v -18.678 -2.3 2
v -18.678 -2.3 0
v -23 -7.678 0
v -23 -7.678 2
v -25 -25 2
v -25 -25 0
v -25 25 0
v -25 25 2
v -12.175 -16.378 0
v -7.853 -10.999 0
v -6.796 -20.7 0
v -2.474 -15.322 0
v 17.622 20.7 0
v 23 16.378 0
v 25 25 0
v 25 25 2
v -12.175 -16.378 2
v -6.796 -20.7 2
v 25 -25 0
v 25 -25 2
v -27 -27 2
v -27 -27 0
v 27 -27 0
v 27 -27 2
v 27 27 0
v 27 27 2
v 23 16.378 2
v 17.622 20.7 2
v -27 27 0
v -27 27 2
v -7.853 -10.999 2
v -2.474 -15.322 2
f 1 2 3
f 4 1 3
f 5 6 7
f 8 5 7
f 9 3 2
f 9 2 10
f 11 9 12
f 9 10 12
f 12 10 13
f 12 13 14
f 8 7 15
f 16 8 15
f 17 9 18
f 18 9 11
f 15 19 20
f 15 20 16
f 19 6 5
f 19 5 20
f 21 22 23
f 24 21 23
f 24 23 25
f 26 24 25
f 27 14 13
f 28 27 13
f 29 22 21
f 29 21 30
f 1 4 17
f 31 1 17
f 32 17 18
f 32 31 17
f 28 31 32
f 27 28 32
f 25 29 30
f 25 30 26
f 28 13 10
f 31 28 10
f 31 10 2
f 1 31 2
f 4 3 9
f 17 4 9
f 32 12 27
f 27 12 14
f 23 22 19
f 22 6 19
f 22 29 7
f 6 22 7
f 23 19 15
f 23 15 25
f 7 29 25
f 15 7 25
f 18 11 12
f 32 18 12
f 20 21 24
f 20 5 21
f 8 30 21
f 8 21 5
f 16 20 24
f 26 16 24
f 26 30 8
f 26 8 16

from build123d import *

# Parameters (mm, degrees)
SKETCH1_W           = 54
SKETCH1_H           = 54
SKETCH1_W_2         = 50
SKETCH1_H_2         = 50
BOSS_EXTRUDE1_DEPTH = 2


with BuildPart() as part:
    # Sketch1 → Boss-Extrude1 (new body)
    with BuildSketch(Plane.XY):
        Rectangle(SKETCH1_W, SKETCH1_H)
        Rectangle(SKETCH1_W_2, SKETCH1_H_2, mode=Mode.SUBTRACT)
        Polygon((-7.852659733, -10.999258133), (-12.17491912, -16.377740612), (-6.796436641, -20.7), (-2.474177253, -15.32151752), align=None)
        Polygon((-18.677740612, -2.3), (-23, -7.67848248), (-12.17491912, -16.377740612), (-7.852659733, -10.999258133), align=None)
        Polygon((17.62151752, 20.7), (-7.852659733, -10.999258133), (-2.474177253, -15.32151752), (23, 16.377740612), align=None)
    extrude(amount=BOSS_EXTRUDE1_DEPTH)


solid = part.part
